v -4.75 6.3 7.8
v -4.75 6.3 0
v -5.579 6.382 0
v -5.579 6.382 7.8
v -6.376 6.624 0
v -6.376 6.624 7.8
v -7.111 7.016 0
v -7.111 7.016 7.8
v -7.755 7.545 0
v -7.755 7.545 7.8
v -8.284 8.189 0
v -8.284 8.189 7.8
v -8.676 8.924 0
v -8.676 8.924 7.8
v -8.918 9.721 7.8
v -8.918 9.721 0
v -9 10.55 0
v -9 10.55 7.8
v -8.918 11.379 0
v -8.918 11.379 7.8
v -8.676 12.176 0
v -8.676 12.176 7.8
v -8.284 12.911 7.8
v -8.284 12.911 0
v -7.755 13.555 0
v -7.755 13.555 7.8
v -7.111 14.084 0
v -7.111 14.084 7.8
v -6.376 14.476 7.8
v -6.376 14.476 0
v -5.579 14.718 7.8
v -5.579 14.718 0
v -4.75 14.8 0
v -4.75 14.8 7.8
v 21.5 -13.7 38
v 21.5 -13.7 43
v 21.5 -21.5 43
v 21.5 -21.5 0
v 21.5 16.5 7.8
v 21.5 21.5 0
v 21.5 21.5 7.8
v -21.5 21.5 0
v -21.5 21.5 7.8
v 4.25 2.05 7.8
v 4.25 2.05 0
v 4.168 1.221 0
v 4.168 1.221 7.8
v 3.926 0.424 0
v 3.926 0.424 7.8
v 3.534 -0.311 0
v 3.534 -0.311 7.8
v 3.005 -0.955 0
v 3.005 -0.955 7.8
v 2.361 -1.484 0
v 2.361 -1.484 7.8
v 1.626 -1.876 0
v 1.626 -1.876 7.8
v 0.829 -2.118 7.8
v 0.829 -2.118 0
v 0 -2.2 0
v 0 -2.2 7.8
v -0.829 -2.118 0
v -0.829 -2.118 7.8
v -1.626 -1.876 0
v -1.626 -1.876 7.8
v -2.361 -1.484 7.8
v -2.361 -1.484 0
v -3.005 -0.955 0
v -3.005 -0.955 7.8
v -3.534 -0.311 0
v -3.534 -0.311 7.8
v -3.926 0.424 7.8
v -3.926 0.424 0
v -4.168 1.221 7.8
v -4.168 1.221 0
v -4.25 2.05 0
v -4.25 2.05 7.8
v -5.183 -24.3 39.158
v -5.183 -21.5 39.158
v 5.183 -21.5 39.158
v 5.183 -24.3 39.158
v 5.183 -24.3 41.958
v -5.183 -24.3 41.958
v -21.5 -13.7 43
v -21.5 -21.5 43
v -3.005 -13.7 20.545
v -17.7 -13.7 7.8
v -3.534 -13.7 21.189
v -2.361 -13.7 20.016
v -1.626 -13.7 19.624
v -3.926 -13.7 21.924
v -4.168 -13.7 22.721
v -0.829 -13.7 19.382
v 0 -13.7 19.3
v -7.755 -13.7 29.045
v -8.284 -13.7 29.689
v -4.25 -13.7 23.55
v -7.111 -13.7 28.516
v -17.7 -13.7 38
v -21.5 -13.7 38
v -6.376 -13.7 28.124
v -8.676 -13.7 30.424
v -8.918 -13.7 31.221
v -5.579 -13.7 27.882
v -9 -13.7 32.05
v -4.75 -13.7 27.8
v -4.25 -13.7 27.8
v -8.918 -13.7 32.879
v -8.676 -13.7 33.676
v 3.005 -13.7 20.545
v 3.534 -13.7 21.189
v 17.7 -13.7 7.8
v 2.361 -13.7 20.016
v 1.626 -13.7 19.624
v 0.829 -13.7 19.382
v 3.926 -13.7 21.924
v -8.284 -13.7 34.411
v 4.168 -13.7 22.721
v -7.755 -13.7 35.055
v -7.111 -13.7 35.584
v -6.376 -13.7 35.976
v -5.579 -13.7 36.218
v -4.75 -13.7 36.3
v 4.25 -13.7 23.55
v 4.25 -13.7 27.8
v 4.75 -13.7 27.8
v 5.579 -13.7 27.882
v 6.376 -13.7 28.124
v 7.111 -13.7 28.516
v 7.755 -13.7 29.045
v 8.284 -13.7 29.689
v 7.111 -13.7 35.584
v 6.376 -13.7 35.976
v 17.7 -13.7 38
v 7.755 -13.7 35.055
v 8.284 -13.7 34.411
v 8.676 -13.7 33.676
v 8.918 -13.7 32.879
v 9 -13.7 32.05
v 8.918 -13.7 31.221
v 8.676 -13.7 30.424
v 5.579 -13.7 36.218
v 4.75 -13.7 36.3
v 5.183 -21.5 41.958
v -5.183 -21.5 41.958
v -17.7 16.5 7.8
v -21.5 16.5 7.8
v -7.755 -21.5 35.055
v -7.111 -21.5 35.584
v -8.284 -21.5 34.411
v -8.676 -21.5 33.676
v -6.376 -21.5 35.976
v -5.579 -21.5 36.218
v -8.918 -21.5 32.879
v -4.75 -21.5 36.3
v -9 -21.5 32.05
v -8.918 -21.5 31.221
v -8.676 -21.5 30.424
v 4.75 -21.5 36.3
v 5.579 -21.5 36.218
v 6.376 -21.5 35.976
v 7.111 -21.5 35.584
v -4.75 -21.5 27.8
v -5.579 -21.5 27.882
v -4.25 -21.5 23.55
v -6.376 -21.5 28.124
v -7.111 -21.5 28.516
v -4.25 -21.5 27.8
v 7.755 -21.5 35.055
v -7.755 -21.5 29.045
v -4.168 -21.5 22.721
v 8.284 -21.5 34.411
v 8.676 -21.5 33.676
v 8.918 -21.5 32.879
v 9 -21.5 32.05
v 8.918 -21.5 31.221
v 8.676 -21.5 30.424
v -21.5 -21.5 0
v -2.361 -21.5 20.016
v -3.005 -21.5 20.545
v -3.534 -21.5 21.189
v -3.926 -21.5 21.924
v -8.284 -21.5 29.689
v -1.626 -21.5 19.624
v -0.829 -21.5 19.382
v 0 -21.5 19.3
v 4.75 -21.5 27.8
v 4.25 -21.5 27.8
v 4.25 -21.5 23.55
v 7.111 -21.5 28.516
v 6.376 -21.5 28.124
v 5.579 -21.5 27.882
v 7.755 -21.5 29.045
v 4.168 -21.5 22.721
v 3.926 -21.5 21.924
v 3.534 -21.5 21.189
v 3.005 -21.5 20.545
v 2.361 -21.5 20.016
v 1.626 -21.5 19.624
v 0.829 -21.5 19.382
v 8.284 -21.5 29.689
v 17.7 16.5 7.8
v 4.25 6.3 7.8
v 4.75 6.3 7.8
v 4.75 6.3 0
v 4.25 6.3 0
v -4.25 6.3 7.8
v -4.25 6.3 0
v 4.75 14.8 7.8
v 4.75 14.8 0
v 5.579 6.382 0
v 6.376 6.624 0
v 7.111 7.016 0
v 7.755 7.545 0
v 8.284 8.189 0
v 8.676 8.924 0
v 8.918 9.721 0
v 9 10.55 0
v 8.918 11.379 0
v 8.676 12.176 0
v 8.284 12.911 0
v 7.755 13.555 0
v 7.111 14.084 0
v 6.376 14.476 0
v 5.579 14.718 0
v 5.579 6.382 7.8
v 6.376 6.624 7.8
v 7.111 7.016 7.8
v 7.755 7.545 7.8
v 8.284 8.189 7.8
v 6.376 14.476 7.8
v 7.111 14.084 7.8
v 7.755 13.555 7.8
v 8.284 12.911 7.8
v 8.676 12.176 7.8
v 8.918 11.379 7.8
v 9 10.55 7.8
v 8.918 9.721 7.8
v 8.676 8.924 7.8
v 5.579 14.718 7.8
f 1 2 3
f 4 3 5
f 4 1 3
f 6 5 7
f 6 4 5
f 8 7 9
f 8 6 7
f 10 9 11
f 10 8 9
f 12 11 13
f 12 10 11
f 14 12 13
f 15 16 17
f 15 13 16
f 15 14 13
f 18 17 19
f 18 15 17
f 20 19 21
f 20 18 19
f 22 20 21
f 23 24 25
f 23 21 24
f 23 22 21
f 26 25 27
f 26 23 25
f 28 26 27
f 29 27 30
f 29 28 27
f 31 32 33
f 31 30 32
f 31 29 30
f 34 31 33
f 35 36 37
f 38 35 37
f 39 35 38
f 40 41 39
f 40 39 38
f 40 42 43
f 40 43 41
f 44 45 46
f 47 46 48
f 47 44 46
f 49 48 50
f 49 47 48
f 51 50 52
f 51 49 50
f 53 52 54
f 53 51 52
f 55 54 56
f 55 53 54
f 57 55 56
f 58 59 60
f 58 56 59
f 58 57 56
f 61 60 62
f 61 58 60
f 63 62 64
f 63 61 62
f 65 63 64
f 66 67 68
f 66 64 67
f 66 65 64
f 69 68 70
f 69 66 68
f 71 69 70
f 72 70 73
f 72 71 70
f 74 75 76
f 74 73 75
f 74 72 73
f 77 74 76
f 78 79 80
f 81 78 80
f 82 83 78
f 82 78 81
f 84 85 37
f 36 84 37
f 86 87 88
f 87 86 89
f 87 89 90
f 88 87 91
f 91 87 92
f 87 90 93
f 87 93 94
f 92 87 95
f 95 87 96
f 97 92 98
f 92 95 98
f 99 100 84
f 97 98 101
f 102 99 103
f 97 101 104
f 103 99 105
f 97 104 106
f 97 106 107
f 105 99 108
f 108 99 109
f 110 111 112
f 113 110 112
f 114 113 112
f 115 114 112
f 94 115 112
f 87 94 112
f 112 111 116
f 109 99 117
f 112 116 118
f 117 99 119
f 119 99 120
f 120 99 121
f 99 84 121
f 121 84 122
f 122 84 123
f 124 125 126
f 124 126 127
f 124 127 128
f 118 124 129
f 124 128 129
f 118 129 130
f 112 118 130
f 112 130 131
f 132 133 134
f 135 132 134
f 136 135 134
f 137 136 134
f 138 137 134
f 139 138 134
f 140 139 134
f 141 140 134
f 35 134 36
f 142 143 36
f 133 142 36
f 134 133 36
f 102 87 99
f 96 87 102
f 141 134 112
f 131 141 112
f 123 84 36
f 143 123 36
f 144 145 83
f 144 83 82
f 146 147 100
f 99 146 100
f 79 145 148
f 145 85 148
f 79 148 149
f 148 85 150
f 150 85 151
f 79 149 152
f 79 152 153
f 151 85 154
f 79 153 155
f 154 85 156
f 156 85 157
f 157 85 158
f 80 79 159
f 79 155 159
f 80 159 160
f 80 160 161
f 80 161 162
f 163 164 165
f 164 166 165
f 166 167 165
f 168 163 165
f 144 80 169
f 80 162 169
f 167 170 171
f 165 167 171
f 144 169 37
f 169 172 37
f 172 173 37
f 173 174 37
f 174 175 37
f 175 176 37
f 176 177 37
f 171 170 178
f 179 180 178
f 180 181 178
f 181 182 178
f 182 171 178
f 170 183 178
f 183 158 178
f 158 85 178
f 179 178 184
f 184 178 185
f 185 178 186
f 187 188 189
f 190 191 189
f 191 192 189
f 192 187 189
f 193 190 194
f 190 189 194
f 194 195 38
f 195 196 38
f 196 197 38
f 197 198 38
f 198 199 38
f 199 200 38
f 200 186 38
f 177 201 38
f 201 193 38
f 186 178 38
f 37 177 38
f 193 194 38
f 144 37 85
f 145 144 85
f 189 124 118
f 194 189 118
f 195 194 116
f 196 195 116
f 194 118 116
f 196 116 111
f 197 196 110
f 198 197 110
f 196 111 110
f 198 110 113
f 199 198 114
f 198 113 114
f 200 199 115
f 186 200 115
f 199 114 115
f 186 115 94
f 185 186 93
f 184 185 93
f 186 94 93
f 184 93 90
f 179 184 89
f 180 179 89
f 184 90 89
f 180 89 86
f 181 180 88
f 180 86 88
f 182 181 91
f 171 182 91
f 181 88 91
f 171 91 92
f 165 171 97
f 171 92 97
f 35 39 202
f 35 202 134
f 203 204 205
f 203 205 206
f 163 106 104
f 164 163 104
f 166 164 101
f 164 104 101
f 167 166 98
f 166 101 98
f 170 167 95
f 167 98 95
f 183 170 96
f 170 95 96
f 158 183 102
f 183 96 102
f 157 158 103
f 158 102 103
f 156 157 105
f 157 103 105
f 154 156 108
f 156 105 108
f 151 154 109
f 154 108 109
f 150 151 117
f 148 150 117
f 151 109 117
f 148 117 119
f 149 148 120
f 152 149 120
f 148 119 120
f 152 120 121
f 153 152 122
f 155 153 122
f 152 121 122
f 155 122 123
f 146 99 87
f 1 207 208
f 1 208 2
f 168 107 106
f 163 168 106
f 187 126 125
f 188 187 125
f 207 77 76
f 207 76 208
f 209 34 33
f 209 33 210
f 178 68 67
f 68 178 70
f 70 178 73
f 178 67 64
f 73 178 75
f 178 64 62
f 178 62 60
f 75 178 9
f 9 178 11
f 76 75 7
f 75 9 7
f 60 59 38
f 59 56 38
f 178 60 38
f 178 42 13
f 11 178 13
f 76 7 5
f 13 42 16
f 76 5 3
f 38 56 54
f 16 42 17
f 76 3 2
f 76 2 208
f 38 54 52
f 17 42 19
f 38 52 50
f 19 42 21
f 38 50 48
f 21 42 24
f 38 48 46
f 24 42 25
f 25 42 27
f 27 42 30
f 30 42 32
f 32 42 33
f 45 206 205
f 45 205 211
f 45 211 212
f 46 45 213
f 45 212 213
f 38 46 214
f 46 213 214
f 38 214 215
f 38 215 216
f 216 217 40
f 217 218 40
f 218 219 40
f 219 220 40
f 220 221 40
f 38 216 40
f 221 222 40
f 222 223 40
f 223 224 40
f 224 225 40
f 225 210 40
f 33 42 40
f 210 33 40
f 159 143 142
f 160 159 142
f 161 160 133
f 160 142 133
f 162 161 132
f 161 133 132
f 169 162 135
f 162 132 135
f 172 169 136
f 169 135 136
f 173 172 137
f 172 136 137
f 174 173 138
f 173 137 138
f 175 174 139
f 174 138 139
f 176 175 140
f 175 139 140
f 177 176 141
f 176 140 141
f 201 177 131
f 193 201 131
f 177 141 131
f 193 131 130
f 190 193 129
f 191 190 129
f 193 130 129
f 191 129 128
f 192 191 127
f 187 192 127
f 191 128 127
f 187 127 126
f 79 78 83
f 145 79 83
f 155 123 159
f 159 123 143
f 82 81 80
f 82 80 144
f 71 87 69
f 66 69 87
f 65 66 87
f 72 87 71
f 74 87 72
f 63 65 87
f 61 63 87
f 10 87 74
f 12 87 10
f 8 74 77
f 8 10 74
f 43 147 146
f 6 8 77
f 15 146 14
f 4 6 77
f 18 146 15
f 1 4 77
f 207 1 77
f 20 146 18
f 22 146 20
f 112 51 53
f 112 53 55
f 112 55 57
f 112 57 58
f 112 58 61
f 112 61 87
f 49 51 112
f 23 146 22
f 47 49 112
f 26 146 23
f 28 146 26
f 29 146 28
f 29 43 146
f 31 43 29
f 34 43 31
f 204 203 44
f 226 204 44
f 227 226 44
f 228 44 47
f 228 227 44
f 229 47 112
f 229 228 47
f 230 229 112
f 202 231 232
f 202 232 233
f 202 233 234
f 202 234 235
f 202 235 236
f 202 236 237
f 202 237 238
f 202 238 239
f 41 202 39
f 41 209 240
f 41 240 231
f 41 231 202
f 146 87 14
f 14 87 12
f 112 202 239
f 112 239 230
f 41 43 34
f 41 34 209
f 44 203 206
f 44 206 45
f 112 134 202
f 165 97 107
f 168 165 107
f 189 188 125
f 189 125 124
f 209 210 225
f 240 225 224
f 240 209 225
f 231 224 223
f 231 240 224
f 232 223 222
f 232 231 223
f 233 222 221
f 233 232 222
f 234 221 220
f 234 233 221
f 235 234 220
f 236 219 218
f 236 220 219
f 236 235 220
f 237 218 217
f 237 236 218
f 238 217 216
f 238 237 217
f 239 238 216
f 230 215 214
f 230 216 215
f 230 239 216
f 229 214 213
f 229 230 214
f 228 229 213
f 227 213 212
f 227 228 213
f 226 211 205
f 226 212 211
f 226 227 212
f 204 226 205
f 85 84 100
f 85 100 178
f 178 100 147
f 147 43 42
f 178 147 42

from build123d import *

# Parameters (mm, degrees)
SKETCH_1_W          = 43
SKETCH_1_H          = 43
EXTRUDE_1_DEPTH     = 7.8
SKETCH_3_W          = 43
SKETCH_3_H          = 43
EXTRUDE_2_DEPTH     = 7.8
EXTRUDE_3_DEPTH     = 3.8
CUT_EXTRUDE_1_DEPTH = 47.5138689
SKETCH_6_W          = 10.365035434
SKETCH_6_H          = 2.8
EXTRUDE_5_DEPTH     = 2.8


with BuildPart() as part:
    # 草图1 → 凸台-拉伸1 (new body)
    with BuildSketch(Plane.XY):
        Rectangle(SKETCH_1_W, SKETCH_1_H)
    extrude(amount=EXTRUDE_1_DEPTH)

    # 草图3 → 凸台-拉伸2 (add)
    with BuildSketch(Plane.XZ.offset(21.5)):
        with Locations((0, 21.5)):
            Rectangle(SKETCH_3_W, SKETCH_3_H)
    extrude(amount=-EXTRUDE_2_DEPTH)

    # 草图4 → 凸台-拉伸3 (add)
    with BuildSketch(Plane.ZY.offset(21.5)):
        Polygon((7.8, 16.5), (38, -13.7), (7.8, -13.7), align=None)
    extrude_3 = extrude(amount=-EXTRUDE_3_DEPTH)

    # 镜向1: 凸台-拉伸3 across plane
    add(extrude_3.mirror(Plane(origin=(0, 0, 0), x_dir=(0, 0, 1), z_dir=(1, 0, 0))))

    # 草图5 → 切除-拉伸1 (cut, through all)
    with BuildSketch(Plane.XY.offset(7.8)):
        with BuildLine():
            Line((-4.25, 2.05), (-4.25, 6.3))
            Line((-4.25, 6.3), (-4.75, 6.3))
            ThreePointArc((-4.75, 6.3), (-9, 10.55), (-4.75, 14.8))
            Line((-4.75, 14.8), (4.75, 14.8))
            ThreePointArc((4.75, 14.8), (9, 10.55), (4.75, 6.3))
            Line((4.75, 6.3), (4.25, 6.3))
            Line((4.25, 6.3), (4.25, 2.05))
            ThreePointArc((4.25, 2.05), (0, -2.2), (-4.25, 2.05))
        make_face()
    cut_extrude_1 = extrude(amount=-CUT_EXTRUDE_1_DEPTH, mode=Mode.SUBTRACT)

    # 镜向2: 切除-拉伸1 across plane
    add(cut_extrude_1.mirror(Plane(origin=(0, -10.75, 10.75), x_dir=(0, 0.7071067811865478, 0.7071067811865472), z_dir=(0, 0.7071067811865475, -0.7071067811865477))), mode=Mode.SUBTRACT)

    # 草图6 → 凸台-拉伸5 (add)
    with BuildSketch(Plane.XZ.offset(21.5)):
        with Locations((0, 40.55829283)):
            Rectangle(SKETCH_6_W, SKETCH_6_H)
    extrude(amount=EXTRUDE_5_DEPTH)


solid = part.part
